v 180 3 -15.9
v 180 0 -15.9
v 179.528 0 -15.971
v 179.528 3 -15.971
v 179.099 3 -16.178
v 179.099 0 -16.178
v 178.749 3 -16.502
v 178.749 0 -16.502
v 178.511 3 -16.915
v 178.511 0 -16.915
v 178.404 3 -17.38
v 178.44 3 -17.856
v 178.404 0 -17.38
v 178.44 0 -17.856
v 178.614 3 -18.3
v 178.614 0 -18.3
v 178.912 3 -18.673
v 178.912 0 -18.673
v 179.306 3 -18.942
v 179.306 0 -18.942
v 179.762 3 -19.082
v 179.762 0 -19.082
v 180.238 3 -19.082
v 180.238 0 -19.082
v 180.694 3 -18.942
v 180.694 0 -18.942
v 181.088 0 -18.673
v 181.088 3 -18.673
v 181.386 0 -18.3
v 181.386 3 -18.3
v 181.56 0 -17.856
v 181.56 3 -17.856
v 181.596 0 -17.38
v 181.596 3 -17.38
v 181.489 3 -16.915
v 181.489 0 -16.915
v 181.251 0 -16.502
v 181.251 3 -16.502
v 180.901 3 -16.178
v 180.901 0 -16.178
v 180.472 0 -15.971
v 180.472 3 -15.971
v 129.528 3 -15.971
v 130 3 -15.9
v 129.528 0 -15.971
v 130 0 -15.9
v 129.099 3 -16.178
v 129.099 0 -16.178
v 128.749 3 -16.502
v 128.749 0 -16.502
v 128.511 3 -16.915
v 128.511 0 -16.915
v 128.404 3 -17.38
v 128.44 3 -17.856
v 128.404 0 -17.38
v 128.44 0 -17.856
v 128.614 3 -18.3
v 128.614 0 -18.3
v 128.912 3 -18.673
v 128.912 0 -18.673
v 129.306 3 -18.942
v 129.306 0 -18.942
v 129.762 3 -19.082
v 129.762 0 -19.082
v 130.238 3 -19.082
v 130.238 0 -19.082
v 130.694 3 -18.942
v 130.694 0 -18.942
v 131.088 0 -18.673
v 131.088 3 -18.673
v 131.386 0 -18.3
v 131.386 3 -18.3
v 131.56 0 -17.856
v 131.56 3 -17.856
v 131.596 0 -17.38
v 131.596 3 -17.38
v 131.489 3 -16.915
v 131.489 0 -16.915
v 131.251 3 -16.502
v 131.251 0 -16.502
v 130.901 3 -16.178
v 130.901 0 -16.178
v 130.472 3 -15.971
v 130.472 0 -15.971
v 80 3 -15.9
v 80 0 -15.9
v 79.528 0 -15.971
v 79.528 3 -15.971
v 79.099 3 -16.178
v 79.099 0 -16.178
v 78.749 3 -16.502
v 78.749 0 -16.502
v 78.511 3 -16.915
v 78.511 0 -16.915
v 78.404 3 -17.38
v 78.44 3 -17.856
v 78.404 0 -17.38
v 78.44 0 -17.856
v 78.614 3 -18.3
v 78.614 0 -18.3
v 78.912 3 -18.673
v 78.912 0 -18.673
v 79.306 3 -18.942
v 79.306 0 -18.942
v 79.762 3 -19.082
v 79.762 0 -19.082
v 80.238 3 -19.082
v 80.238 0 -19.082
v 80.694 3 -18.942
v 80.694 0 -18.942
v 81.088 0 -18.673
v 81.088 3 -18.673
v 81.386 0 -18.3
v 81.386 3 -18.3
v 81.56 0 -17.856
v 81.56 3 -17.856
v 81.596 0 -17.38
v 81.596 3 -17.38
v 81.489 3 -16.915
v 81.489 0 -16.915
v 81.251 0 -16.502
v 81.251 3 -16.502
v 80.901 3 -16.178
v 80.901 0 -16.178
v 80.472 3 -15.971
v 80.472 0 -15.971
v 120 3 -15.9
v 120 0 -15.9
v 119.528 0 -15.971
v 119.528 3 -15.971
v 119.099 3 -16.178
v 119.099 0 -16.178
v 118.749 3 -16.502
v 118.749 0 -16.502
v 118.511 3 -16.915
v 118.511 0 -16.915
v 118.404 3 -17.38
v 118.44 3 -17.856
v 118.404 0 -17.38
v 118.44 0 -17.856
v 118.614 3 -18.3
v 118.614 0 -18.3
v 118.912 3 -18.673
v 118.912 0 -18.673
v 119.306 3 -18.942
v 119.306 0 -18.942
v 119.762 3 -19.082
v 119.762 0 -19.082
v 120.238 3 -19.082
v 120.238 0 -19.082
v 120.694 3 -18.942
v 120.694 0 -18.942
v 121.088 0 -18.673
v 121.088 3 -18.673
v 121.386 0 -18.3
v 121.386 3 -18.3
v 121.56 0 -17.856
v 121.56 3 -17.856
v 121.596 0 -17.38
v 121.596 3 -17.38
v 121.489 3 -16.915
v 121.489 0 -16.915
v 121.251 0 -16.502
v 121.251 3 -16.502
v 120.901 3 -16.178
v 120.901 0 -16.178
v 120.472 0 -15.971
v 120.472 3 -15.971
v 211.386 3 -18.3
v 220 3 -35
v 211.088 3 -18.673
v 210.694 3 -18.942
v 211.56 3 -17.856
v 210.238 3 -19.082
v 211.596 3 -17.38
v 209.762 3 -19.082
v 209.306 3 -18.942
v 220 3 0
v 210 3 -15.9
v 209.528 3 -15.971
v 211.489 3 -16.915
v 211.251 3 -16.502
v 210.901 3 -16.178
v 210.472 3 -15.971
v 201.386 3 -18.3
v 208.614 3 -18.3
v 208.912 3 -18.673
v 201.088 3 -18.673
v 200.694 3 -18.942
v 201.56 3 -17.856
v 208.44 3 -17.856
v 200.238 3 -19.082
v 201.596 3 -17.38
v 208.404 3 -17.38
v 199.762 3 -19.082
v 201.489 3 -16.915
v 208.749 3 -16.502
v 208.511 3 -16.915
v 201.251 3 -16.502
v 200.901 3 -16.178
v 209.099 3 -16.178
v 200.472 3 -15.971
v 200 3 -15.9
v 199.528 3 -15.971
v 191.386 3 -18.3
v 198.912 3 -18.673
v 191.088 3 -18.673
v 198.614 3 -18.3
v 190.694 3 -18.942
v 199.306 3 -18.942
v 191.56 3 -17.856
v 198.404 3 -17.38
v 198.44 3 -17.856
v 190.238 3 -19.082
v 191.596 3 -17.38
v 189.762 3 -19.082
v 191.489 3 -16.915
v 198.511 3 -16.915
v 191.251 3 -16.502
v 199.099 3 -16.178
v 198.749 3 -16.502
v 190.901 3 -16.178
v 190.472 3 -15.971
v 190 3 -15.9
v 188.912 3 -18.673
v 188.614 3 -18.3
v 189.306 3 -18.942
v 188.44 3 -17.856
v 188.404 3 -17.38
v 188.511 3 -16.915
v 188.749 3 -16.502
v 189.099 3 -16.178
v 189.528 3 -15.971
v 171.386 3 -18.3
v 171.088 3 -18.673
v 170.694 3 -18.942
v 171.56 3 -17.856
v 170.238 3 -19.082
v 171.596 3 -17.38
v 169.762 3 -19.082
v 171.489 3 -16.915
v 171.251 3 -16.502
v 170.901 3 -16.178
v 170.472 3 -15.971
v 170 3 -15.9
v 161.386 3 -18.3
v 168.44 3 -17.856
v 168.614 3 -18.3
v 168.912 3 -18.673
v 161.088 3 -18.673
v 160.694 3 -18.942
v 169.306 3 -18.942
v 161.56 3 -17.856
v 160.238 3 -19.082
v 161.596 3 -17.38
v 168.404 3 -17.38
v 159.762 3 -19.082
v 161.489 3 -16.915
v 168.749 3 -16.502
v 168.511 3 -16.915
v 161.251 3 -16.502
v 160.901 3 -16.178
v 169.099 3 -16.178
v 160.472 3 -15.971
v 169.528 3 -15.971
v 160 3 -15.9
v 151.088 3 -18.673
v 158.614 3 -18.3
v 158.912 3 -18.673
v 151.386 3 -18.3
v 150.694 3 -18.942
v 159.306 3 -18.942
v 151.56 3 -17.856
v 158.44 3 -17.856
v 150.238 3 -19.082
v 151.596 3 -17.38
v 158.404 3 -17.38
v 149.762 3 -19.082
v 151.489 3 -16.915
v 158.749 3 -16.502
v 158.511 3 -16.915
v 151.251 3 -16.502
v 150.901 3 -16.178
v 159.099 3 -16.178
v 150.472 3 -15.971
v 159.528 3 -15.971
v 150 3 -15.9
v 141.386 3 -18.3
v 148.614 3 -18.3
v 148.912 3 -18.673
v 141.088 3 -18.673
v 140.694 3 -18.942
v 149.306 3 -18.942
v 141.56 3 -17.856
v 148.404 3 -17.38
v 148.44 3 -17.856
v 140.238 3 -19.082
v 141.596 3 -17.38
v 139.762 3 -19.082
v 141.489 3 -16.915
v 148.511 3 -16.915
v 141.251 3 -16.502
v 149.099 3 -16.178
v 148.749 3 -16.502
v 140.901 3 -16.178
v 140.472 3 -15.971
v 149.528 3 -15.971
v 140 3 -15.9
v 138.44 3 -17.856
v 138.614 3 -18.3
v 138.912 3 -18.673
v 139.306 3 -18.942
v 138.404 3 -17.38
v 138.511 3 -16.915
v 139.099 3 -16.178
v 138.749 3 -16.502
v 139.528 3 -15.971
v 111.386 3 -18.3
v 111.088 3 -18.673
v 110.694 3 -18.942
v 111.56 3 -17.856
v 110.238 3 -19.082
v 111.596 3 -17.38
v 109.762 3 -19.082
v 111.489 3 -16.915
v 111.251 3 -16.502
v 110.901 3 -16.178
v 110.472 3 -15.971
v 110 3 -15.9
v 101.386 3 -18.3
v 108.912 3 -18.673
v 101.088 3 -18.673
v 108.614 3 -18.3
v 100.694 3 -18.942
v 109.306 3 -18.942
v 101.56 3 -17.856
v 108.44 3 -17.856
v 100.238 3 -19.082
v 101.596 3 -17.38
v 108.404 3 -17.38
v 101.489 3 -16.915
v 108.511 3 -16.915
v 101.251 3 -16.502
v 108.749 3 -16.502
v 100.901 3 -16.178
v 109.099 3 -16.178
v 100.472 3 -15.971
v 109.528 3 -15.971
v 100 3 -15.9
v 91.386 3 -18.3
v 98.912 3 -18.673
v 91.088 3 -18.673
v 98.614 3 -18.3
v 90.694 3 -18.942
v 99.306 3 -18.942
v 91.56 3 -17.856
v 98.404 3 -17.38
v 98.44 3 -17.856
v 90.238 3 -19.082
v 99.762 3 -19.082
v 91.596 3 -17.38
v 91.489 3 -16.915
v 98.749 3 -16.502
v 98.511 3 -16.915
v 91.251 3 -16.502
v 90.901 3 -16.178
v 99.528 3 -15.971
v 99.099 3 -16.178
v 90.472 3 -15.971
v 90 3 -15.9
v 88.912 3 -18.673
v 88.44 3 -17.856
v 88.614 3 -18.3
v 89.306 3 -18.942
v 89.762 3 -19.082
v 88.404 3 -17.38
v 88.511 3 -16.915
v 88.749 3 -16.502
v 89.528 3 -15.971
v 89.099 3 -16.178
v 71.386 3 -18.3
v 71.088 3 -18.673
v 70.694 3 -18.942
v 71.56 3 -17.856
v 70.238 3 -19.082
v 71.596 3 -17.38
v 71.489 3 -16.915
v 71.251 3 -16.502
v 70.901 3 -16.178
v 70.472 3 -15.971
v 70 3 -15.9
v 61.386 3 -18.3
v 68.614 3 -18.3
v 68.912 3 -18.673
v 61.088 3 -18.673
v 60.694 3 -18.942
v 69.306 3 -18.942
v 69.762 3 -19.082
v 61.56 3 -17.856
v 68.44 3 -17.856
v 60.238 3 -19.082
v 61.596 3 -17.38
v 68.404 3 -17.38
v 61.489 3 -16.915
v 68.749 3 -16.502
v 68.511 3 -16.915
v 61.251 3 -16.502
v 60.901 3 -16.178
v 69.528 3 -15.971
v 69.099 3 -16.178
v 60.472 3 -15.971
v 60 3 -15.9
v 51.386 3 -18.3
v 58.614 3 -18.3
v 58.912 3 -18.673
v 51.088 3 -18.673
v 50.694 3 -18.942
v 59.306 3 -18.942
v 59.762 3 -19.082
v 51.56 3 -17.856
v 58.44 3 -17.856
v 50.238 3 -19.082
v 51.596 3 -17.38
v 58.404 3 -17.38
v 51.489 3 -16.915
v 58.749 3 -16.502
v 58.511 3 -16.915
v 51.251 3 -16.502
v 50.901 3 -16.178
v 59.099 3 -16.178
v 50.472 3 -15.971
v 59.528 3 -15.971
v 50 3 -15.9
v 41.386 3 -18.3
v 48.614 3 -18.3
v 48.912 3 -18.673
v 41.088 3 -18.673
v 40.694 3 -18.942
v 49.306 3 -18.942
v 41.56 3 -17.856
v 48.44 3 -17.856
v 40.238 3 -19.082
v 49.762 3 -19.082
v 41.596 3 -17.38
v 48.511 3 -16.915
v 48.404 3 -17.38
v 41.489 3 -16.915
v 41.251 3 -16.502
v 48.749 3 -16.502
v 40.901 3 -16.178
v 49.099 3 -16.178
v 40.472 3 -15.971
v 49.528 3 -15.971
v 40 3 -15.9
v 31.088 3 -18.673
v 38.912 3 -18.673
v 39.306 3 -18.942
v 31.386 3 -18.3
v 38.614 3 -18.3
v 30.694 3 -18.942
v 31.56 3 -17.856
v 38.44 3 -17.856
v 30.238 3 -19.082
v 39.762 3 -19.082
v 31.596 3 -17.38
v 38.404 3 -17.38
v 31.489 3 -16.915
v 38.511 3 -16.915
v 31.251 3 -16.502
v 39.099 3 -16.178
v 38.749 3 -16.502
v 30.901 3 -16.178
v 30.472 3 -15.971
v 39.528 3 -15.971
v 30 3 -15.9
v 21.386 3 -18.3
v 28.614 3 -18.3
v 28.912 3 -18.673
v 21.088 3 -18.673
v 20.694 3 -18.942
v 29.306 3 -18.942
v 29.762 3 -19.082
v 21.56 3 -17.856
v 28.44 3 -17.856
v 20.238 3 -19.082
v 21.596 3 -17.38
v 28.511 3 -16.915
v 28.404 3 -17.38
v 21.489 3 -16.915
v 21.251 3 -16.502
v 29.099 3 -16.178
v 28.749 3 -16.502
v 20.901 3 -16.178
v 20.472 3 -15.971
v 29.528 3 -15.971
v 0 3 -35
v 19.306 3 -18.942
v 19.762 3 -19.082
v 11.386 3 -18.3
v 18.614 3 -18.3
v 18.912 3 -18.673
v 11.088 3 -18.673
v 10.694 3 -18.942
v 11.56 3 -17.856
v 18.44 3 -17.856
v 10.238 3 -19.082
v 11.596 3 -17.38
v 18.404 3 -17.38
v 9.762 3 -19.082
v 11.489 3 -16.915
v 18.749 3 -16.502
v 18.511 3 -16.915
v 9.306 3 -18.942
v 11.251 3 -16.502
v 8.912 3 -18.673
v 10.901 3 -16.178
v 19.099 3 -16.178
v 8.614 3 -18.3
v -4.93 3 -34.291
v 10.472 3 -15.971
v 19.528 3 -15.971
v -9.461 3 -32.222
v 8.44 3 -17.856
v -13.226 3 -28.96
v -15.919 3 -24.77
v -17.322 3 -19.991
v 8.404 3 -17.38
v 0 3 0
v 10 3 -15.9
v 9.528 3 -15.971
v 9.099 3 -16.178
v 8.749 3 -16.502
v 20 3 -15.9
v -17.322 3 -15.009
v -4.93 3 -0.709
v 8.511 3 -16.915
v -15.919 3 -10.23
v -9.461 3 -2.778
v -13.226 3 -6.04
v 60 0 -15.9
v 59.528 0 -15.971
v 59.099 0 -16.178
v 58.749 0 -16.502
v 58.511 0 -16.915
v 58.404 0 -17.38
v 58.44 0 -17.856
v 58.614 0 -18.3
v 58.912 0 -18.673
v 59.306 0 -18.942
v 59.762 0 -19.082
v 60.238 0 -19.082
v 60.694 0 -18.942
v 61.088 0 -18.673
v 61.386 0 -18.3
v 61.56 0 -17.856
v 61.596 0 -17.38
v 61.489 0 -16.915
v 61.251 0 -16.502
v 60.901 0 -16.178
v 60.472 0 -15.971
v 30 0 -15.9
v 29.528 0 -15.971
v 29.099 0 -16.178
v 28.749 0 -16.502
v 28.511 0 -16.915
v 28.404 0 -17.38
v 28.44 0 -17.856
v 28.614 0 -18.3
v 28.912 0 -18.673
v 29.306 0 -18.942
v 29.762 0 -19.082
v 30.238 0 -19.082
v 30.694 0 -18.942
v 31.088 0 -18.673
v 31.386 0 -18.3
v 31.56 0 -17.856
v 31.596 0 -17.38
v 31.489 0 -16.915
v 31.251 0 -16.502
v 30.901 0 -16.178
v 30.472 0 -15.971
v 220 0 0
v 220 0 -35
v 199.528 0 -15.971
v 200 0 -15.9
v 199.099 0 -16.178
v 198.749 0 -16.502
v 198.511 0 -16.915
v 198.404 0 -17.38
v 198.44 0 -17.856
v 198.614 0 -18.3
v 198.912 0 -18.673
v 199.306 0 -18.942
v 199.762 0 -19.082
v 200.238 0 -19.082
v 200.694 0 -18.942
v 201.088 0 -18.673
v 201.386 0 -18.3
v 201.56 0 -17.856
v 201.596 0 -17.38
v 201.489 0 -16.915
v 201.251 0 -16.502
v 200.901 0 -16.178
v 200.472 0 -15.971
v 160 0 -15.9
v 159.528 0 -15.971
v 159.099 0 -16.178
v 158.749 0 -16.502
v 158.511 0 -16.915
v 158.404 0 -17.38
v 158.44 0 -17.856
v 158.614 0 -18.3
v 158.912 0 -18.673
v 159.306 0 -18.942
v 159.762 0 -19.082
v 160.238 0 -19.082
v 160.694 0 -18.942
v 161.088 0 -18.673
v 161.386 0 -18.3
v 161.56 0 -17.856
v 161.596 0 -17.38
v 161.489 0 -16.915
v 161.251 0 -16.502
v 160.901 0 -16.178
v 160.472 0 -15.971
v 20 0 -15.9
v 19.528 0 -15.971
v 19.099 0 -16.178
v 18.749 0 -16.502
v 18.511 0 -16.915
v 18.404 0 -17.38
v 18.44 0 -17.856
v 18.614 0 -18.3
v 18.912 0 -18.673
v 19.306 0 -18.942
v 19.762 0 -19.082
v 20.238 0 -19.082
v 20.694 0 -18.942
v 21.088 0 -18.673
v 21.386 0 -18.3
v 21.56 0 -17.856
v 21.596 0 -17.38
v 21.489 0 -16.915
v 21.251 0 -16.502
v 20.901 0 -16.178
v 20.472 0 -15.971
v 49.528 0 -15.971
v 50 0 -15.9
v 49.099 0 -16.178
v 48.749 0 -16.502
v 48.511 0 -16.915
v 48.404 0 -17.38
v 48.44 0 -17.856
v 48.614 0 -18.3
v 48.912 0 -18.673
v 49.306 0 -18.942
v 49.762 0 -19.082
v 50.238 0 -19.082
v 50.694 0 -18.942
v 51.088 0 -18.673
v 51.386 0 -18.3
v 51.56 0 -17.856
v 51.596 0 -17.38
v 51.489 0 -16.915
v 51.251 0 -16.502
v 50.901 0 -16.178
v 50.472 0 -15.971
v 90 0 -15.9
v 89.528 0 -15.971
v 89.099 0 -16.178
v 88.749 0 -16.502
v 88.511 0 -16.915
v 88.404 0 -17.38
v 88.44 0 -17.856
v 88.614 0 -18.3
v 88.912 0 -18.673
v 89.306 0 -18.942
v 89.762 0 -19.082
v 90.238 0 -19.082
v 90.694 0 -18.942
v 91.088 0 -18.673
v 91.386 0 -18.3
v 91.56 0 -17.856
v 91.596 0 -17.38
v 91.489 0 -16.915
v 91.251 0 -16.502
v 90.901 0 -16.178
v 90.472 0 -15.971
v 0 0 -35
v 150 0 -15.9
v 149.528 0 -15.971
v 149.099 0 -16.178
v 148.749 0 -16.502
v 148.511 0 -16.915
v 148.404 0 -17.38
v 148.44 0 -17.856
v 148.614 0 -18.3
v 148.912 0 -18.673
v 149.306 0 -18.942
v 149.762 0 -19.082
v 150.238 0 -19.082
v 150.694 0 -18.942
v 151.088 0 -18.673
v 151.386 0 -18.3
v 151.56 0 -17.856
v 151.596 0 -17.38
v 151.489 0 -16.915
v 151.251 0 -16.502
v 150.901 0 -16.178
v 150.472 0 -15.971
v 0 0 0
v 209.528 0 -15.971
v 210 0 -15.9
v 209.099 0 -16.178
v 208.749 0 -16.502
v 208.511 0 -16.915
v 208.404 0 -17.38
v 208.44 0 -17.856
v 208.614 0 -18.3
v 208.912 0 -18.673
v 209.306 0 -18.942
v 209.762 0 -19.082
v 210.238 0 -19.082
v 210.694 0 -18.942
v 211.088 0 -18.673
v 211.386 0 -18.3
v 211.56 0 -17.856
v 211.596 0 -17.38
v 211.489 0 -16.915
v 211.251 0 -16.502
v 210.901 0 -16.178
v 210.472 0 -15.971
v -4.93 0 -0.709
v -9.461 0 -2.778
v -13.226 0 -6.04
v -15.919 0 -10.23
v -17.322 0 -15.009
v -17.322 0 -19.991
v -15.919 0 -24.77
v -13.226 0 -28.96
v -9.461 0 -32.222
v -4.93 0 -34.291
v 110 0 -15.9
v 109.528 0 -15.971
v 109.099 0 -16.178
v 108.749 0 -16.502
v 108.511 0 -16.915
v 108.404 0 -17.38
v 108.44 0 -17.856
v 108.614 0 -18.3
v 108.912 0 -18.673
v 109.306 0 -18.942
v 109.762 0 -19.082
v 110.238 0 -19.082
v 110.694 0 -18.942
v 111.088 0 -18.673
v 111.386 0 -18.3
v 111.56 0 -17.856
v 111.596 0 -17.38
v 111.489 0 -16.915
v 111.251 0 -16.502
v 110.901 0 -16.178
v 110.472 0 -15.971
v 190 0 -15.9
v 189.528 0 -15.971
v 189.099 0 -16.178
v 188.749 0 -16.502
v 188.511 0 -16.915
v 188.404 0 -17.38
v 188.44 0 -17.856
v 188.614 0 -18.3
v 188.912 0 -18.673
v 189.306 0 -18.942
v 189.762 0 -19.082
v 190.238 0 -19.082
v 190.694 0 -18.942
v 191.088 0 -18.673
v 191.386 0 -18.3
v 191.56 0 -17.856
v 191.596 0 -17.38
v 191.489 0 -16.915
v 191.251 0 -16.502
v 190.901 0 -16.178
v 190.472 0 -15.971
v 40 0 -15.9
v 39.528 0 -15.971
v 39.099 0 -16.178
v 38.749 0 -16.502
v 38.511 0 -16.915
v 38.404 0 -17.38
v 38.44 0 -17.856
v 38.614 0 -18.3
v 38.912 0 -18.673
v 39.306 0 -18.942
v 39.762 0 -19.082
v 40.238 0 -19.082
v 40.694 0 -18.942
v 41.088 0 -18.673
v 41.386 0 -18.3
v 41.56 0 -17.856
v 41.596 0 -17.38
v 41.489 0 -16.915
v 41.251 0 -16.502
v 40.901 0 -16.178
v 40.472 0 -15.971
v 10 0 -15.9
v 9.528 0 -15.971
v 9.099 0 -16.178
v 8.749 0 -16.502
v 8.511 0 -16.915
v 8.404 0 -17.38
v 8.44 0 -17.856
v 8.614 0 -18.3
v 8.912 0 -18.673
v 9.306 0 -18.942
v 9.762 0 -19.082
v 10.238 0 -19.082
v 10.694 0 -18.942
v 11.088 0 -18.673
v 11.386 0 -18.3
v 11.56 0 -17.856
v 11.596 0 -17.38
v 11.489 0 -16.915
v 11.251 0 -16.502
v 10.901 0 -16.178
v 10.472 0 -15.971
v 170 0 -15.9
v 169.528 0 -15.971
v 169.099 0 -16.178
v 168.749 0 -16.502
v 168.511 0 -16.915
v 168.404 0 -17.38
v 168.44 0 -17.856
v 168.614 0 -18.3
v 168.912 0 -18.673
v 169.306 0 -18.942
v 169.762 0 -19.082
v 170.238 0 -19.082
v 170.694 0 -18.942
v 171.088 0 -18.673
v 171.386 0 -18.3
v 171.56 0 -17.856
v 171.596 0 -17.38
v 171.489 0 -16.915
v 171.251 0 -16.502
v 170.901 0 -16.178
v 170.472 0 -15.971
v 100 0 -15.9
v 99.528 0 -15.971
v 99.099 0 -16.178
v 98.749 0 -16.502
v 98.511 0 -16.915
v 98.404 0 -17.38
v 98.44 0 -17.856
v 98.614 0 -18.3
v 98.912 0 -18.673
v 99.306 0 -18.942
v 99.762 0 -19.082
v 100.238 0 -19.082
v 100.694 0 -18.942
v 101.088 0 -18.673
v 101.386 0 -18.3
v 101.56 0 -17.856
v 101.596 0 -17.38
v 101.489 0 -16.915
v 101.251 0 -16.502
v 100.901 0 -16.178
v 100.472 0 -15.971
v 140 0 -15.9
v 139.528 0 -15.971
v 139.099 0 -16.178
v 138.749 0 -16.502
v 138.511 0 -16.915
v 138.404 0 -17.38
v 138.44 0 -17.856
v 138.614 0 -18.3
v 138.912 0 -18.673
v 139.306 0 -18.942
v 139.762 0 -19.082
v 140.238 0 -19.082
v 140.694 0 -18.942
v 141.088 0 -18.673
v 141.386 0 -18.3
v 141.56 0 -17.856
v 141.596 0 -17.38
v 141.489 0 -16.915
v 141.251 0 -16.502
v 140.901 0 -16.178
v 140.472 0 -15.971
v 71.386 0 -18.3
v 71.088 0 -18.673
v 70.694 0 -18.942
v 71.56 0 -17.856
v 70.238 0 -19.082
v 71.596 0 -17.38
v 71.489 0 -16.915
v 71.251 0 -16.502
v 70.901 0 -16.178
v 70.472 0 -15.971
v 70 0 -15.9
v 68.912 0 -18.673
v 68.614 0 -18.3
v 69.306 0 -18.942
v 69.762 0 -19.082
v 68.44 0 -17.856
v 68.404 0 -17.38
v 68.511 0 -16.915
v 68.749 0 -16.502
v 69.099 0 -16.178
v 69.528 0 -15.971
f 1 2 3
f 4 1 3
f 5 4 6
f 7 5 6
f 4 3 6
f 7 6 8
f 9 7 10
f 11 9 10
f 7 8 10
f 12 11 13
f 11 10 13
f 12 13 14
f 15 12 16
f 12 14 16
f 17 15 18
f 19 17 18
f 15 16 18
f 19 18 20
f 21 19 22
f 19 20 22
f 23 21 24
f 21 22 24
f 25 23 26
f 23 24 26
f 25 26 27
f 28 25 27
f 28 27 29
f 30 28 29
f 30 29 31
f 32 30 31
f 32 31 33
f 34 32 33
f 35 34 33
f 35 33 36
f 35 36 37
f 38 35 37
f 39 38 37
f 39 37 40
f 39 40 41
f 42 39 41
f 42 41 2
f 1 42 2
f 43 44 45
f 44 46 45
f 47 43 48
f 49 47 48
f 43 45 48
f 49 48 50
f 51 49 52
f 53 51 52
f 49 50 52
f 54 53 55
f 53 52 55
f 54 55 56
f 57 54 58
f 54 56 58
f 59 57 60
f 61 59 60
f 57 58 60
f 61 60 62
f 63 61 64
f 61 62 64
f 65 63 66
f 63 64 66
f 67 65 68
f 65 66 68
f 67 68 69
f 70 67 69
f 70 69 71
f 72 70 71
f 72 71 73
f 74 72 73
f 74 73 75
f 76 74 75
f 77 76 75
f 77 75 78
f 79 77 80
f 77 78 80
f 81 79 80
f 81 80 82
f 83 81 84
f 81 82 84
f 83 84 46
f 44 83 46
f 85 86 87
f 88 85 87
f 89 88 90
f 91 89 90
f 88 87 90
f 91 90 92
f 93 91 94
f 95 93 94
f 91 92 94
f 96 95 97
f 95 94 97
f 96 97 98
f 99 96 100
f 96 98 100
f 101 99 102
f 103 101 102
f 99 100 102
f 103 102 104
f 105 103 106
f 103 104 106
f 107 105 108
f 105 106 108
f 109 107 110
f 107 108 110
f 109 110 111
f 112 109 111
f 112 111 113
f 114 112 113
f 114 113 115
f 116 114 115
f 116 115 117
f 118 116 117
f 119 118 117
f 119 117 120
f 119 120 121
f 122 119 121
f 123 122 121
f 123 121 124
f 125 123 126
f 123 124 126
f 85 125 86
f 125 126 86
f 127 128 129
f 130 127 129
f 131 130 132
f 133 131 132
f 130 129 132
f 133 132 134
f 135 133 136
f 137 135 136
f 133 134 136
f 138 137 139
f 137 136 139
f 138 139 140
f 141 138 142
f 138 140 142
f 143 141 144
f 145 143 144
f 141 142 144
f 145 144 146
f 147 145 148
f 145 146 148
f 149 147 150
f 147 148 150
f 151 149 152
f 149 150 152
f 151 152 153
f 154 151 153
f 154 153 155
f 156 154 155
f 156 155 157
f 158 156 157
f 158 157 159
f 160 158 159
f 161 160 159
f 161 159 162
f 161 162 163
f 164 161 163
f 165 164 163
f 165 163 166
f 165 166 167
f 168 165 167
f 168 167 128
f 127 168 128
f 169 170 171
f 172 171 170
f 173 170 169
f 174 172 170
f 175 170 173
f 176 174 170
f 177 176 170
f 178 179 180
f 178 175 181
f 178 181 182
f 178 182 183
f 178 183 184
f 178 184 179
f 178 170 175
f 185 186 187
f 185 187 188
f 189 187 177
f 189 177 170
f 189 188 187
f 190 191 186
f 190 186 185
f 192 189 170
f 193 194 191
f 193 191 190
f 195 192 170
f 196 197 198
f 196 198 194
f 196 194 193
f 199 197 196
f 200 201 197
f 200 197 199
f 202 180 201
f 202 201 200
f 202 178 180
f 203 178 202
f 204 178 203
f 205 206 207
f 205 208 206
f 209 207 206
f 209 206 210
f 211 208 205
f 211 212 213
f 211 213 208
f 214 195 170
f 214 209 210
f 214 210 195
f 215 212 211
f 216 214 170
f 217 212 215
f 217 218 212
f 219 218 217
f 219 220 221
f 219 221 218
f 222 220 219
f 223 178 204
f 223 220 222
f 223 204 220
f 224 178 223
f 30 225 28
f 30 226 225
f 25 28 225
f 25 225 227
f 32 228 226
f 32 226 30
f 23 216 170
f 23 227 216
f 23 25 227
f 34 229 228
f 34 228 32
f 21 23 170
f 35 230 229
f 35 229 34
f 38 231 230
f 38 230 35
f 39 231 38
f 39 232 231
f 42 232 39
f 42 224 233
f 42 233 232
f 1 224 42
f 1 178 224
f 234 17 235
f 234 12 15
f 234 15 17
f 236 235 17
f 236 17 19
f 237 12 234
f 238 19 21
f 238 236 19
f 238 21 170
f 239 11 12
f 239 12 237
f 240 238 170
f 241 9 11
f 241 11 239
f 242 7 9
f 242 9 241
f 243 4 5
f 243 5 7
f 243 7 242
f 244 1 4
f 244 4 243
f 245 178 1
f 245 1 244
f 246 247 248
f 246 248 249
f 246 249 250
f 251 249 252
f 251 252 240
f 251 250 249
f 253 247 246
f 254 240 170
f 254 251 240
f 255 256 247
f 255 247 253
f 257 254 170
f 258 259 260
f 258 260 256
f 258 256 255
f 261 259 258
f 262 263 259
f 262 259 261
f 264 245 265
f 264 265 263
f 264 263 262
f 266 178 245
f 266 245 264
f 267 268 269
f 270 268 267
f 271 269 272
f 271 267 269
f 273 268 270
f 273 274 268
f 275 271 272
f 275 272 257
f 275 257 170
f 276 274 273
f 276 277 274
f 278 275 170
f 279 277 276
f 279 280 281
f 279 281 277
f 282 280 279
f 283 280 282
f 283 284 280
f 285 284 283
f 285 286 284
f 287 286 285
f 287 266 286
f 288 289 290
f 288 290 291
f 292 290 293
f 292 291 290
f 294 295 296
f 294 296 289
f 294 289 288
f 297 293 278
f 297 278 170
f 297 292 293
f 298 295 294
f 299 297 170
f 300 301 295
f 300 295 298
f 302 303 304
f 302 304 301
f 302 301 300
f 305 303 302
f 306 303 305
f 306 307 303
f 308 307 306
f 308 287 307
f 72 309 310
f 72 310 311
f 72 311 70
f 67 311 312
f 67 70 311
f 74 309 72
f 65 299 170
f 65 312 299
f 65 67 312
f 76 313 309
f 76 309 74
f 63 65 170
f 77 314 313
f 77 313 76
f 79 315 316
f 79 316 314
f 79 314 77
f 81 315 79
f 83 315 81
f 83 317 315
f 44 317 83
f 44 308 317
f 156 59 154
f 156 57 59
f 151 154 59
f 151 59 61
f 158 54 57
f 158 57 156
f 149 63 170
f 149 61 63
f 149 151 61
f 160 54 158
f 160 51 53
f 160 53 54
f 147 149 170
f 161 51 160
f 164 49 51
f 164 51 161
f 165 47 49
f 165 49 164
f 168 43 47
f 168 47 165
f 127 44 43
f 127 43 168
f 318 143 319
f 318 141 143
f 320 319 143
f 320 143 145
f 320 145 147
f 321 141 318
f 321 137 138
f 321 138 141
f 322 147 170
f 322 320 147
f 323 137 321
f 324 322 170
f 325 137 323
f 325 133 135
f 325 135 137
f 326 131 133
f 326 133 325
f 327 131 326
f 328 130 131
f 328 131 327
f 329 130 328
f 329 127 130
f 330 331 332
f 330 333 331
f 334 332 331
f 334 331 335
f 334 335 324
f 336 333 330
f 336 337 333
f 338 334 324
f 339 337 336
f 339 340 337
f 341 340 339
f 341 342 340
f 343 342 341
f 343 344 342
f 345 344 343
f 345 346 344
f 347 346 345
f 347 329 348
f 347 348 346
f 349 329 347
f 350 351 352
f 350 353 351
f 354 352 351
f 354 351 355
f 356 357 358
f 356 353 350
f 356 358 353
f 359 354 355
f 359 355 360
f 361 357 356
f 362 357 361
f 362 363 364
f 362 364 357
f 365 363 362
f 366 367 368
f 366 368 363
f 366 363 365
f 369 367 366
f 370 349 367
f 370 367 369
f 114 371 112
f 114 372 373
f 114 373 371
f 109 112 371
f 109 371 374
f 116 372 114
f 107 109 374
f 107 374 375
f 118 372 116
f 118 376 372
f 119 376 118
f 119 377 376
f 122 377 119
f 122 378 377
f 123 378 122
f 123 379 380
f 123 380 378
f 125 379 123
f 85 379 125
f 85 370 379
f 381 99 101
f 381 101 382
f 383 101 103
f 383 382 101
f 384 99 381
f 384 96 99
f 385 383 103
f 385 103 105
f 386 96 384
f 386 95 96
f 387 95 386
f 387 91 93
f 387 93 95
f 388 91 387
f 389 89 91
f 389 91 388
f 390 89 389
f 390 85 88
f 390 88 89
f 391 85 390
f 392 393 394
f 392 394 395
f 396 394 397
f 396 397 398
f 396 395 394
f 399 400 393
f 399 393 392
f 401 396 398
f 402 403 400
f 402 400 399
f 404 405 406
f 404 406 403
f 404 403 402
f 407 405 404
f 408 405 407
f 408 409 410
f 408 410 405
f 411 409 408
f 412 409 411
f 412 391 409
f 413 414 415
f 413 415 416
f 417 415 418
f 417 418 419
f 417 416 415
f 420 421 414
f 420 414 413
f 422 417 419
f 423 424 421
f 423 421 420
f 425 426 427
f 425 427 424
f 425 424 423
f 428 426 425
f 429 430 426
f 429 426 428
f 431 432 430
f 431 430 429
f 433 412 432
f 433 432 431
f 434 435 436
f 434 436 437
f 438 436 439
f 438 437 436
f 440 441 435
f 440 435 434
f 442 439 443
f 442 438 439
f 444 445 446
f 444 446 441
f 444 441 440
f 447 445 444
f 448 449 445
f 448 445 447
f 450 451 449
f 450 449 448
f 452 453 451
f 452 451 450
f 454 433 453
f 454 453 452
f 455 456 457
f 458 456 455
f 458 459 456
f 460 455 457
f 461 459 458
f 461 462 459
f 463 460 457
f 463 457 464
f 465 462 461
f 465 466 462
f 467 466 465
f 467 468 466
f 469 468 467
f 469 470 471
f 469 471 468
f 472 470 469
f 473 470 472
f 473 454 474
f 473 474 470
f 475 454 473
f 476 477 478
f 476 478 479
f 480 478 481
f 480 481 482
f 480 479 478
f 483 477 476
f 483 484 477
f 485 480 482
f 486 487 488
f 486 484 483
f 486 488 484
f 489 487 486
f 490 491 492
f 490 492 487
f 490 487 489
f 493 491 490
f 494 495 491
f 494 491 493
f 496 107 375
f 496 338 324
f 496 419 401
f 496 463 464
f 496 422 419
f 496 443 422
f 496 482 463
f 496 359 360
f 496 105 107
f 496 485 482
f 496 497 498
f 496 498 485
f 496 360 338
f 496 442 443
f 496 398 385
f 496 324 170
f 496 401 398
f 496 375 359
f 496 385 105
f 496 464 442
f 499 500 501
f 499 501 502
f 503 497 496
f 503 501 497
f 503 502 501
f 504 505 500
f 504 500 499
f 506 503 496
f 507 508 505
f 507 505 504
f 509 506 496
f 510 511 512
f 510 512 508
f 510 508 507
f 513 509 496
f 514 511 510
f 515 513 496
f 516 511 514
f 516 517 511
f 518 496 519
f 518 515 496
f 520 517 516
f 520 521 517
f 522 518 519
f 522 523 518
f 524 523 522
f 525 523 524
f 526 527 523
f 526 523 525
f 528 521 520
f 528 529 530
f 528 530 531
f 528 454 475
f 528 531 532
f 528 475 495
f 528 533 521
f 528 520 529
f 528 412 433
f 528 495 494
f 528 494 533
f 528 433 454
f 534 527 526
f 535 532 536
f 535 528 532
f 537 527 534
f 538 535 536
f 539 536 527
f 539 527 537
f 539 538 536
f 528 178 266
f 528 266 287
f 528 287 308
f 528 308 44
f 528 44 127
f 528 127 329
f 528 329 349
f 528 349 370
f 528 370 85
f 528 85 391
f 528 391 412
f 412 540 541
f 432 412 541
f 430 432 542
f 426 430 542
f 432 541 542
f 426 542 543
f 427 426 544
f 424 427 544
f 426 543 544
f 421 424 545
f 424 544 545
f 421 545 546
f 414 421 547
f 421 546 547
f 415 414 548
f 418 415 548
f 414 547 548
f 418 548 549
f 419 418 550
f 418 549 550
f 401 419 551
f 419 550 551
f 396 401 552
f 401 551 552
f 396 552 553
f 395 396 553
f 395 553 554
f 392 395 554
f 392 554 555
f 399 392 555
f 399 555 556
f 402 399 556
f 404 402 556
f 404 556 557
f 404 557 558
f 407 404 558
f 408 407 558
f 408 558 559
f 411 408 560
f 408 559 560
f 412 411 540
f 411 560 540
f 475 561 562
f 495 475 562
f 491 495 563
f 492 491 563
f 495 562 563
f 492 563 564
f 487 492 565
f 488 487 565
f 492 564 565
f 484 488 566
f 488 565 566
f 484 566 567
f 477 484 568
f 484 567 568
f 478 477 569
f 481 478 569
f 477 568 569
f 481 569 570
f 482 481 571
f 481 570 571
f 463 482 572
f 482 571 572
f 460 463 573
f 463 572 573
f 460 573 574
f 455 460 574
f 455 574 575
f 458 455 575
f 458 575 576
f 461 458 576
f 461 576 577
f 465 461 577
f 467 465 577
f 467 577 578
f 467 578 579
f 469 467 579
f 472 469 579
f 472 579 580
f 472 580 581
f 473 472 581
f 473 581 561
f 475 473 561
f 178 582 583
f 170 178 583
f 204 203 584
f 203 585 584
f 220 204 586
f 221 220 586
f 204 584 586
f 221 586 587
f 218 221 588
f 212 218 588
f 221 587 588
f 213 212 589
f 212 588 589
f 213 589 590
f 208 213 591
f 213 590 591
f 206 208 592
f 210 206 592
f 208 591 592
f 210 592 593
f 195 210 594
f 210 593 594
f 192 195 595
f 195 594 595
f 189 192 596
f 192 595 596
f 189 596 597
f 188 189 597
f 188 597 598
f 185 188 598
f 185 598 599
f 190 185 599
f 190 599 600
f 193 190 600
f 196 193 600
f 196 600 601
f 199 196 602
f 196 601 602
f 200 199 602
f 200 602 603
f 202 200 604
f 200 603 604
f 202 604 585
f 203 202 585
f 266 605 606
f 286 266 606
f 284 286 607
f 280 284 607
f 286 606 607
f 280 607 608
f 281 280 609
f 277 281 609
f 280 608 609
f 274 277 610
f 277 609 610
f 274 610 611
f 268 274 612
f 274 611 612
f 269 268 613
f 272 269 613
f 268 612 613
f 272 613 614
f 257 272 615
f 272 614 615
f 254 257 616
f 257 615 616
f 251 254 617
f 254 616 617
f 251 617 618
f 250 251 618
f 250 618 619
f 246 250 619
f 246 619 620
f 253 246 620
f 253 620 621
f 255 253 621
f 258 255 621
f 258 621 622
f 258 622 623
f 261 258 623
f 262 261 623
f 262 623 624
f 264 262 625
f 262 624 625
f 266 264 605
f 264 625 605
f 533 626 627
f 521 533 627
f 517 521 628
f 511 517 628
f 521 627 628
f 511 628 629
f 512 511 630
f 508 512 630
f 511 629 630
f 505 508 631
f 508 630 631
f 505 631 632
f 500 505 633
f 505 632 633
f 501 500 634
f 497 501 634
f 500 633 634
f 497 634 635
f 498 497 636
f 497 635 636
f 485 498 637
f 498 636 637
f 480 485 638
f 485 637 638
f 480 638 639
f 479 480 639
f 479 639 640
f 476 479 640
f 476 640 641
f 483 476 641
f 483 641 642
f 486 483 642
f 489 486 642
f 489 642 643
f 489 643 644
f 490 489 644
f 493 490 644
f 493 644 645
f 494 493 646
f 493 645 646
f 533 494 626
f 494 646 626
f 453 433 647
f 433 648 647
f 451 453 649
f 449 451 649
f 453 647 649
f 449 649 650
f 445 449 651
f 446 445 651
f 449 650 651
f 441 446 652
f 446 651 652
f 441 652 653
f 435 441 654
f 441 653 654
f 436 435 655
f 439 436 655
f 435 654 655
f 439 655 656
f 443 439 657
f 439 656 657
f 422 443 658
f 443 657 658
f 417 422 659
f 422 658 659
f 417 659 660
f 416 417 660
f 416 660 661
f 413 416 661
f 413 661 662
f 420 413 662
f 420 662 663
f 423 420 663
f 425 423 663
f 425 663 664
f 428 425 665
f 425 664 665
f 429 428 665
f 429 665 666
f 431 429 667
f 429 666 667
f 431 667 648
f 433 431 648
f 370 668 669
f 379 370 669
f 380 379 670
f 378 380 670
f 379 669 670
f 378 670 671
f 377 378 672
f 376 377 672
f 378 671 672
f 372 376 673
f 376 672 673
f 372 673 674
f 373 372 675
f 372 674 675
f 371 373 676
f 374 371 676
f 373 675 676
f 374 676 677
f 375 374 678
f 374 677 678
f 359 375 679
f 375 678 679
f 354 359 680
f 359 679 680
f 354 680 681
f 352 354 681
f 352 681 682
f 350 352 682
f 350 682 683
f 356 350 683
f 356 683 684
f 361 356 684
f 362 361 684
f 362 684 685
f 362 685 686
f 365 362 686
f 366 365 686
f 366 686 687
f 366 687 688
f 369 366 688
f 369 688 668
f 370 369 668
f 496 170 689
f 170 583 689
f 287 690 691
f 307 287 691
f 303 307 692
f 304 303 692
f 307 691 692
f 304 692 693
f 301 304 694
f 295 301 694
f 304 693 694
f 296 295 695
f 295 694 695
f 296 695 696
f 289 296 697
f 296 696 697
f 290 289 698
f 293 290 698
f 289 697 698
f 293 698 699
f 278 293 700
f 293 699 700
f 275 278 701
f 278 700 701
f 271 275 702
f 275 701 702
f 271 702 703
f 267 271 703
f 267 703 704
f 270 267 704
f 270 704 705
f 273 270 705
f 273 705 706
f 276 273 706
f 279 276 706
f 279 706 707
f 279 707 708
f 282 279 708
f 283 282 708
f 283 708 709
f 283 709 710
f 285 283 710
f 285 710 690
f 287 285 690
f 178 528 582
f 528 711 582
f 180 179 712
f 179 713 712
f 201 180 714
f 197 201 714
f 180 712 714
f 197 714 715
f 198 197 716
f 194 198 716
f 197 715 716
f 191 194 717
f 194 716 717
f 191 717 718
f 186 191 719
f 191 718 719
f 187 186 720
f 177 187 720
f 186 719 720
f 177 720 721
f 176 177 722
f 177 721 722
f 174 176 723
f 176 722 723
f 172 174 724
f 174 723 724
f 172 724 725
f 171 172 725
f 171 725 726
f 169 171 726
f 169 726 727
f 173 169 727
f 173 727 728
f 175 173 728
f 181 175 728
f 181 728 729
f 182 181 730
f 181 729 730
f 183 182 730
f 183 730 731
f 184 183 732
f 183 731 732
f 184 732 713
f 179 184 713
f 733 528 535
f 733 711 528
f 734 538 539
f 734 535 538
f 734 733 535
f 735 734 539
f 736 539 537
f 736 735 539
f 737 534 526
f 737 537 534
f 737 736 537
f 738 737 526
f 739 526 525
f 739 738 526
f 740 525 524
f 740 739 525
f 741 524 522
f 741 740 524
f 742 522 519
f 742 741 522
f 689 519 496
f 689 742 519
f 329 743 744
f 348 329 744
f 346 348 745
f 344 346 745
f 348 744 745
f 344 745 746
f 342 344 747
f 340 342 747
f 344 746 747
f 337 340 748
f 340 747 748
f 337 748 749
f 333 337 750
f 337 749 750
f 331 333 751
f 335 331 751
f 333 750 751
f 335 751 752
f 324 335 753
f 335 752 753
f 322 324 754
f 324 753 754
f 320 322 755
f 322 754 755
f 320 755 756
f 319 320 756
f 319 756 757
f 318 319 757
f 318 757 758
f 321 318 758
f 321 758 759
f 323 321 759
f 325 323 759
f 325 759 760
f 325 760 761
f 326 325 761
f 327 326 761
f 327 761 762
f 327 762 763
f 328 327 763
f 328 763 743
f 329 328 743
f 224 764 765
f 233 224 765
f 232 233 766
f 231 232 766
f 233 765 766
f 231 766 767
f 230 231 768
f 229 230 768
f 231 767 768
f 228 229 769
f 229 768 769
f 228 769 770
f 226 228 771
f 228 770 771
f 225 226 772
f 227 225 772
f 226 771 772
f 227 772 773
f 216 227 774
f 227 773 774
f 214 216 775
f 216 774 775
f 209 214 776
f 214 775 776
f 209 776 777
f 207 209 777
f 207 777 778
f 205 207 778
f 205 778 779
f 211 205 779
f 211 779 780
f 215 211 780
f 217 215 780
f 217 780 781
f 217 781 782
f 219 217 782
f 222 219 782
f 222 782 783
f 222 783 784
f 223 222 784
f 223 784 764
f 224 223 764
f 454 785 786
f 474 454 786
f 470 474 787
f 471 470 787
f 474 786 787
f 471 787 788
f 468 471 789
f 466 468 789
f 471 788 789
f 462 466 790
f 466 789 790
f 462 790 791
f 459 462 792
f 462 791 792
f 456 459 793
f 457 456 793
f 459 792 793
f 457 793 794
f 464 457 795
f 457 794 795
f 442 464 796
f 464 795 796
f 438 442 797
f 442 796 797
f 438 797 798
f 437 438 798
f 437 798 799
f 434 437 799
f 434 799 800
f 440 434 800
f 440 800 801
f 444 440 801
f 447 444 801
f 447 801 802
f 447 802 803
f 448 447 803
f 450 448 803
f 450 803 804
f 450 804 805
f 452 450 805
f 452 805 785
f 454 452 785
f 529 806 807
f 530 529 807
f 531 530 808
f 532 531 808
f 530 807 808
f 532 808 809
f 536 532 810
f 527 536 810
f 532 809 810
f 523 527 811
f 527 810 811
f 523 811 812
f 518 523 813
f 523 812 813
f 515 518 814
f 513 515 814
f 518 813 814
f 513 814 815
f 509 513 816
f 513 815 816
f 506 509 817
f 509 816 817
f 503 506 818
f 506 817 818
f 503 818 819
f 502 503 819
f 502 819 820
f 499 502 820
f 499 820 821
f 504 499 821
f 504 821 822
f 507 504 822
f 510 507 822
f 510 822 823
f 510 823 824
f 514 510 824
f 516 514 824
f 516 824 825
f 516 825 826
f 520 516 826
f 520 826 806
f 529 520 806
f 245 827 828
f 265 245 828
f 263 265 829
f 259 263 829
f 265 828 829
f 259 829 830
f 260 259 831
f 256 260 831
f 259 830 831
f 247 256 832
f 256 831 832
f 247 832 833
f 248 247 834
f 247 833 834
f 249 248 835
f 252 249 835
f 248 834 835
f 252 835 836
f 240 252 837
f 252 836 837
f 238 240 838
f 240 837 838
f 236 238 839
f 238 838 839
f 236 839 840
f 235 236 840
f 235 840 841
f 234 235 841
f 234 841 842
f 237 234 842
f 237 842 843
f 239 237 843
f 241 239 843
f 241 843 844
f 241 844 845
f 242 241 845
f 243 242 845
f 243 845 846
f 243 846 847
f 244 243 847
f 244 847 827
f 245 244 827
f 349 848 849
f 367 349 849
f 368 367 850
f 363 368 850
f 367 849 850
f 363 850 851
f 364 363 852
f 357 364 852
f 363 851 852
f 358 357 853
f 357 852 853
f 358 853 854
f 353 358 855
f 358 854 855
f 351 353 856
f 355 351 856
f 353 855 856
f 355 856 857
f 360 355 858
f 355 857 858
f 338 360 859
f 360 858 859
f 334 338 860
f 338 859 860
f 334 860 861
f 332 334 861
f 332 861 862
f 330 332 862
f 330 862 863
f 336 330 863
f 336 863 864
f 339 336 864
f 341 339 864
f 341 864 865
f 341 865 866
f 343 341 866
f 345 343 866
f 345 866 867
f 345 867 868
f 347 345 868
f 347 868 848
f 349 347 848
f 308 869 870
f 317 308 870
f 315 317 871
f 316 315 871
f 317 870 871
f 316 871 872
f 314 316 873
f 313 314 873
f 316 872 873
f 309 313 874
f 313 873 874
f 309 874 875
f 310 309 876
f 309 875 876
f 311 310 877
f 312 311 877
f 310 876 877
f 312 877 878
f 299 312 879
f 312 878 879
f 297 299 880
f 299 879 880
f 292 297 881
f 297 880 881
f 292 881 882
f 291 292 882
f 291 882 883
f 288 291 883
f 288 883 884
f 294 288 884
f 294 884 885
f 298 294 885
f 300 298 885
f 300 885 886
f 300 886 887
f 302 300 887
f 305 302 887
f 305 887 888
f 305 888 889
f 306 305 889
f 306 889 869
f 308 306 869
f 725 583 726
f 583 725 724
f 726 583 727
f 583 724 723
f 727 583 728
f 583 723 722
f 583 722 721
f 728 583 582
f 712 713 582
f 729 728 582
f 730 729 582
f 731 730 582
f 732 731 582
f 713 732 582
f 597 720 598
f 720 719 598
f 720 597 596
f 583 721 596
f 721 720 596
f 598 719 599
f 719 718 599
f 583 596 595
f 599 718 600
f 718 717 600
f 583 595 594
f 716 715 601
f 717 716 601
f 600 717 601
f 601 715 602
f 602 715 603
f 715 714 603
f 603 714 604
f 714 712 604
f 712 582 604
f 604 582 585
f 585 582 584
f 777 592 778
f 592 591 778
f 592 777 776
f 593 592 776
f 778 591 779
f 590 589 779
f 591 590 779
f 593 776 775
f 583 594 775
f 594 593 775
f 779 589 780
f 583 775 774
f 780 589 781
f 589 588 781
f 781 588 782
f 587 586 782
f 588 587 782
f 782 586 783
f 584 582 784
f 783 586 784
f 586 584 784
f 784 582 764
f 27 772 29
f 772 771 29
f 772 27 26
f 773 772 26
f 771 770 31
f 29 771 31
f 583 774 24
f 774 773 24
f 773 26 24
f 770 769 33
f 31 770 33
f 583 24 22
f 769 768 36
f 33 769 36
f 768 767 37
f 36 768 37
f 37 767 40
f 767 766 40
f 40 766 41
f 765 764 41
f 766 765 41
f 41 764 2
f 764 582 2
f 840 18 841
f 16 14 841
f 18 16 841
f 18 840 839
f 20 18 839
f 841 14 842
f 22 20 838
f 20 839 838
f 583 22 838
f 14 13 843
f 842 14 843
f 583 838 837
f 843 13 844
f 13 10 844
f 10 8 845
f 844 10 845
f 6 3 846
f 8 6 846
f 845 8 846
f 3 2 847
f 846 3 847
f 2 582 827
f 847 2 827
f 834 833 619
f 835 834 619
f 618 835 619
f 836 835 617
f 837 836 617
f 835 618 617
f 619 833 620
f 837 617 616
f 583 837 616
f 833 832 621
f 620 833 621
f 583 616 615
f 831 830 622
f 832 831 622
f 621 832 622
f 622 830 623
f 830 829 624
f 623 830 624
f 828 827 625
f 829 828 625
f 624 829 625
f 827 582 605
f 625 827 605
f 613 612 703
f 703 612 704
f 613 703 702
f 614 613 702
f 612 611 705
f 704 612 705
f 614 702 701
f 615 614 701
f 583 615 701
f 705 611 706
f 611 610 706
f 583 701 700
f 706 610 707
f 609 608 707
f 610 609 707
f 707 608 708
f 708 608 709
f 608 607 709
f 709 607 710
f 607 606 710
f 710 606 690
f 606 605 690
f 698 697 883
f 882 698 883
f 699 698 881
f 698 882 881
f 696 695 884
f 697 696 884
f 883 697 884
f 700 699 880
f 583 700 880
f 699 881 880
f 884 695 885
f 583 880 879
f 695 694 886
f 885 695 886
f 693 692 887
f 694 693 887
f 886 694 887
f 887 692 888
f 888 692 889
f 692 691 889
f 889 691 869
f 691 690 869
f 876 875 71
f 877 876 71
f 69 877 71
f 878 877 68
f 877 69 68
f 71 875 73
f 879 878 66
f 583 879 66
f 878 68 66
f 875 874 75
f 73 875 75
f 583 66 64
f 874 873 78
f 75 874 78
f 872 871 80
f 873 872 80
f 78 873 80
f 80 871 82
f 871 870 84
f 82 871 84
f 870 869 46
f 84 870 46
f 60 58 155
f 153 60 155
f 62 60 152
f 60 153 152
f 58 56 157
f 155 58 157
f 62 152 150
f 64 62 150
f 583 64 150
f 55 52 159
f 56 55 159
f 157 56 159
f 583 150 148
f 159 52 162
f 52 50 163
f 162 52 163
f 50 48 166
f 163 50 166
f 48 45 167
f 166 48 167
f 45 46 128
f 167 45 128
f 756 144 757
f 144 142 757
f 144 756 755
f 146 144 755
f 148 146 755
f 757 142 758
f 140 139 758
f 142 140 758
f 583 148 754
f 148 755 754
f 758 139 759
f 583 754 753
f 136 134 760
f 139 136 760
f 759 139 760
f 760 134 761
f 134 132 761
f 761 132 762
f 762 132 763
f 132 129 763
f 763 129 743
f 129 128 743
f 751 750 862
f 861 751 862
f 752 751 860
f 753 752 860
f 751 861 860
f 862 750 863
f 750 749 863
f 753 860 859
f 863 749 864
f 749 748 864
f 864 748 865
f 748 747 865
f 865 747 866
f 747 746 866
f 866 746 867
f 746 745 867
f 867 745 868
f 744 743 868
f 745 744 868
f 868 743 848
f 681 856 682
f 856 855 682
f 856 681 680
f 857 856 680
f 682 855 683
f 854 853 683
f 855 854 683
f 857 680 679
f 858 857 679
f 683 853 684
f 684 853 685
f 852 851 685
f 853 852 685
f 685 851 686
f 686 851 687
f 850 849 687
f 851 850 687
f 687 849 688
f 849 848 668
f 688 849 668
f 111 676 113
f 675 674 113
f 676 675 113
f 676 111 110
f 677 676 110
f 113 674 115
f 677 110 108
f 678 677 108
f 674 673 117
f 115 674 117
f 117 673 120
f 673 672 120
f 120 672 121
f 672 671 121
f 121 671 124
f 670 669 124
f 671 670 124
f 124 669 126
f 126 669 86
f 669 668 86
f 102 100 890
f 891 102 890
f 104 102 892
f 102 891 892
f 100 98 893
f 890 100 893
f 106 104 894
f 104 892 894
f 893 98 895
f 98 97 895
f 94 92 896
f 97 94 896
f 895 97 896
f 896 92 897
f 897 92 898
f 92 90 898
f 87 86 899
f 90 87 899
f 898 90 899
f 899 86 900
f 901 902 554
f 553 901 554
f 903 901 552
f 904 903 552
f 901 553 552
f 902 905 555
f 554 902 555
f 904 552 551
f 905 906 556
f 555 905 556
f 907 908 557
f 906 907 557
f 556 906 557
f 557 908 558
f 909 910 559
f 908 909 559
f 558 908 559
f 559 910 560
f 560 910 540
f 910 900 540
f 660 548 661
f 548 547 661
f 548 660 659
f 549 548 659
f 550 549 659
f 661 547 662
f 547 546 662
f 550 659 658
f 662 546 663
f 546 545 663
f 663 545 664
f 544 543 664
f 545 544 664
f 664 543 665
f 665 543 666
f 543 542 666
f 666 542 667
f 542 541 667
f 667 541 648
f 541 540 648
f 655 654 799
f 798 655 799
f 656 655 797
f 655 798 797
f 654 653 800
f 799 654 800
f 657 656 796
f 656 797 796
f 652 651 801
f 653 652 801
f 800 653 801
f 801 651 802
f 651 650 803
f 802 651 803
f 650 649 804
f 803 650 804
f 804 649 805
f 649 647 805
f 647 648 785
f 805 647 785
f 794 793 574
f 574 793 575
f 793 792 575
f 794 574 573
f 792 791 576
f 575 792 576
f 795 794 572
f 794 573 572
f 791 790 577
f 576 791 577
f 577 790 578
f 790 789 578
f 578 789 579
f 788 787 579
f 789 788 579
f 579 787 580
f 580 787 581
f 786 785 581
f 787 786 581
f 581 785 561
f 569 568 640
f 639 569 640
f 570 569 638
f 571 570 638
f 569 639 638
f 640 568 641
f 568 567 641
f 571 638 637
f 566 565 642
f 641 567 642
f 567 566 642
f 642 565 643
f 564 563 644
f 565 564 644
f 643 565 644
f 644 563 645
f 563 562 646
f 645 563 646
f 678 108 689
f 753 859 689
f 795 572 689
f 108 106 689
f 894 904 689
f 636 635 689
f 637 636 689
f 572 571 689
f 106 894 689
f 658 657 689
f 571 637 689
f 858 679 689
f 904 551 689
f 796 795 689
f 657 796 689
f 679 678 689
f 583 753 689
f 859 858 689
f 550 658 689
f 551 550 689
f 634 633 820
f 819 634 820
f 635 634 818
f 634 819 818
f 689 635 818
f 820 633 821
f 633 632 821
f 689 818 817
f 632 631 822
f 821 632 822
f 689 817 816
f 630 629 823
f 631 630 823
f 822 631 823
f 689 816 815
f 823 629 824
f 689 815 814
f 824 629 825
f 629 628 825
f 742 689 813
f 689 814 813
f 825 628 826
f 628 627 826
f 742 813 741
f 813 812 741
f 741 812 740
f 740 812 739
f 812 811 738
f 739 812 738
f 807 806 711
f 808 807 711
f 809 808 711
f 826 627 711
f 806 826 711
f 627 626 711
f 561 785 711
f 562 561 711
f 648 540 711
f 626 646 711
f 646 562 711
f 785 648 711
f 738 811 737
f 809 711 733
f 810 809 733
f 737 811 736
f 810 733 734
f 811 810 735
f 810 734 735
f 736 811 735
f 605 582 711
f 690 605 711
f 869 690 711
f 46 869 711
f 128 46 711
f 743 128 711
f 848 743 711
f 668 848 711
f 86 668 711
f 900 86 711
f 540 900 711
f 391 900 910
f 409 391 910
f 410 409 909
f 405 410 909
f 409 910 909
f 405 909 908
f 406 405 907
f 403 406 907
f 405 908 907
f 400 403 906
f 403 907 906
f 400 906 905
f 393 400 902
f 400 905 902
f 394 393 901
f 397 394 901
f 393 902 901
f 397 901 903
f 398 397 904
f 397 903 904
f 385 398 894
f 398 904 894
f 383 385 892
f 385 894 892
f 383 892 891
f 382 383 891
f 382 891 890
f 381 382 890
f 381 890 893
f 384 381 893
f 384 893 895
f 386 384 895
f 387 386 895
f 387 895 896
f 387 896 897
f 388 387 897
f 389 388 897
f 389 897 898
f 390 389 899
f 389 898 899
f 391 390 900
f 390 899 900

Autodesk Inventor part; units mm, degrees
ref_plane "YZ Plane" through (0, 0, 0) normal (1, 0, 0) x (0, 1, 0)
ref_plane "XZ Plane" through (0, 0, 0) normal (0, 1, 0) x (-1, 0, 0)
ref_plane "XY Plane" through (0, 0, 0) normal (0, 0, 1) x (1, 0, 0)
sketch "スケッチ1" plane through (0, 0, 0) normal (0, 1, 0) x (-1, 0, 0)
  line L0 (0, 0) -> (-220, 0)
  line L1 (-220, 0) -> (-220, -35)
  line L2 (-220, -35) -> (0, -35)
  line L3 (0, -35) -> (0, 0)
  arc A0 (0, -35) -> (0, 0) centre (0, -17.5) ccw
  dimension "d0" = 220
  dimension "d1" = 35
  dimension "d2" = 17.5
extrude "押し出し1" add sketch "スケッチ1" along normal blind 3
sketch "スケッチ2" plane through (0, 3, 0) normal (0, 1, 0) x (1, 0, 0)
  line L0 (0, 17.5) -> (238.6526, 17.5)
  line L1 (0, 0) -> (220, 0) projected
  arc A0 (0, 35) -> (0, 0) centre (0, 17.5) ccw projected
  point P0 (20, 17.5)
  point P1 (30, 17.5)
  point P2 (40, 17.5)
  point P3 (50, 17.5)
  point P4 (60, 17.5)
  point P5 (70, 17.5)
  point P6 (80, 17.5)
  point P7 (90, 17.5)
  point P8 (100, 17.5)
  point P9 (110, 17.5)
  point P10 (120, 17.5)
  point P11 (130, 17.5)
  point P12 (140, 17.5)
  point P13 (150, 17.5)
  point P14 (160, 17.5)
  point P15 (170, 17.5)
  point P16 (180, 17.5)
  point P17 (190, 17.5)
  point P18 (200, 17.5)
  point P19 (210, 17.5)
  point P20 (-17.5, 17.5)
  point P21 (10, 17.5)
  dimension "d5" = 17.5
  dimension "d6" = 10
  dimension "d7" = 10
  dimension "d8" = 10
  dimension "d9" = 10
  dimension "d10" = 10
  dimension "d11" = 10
  dimension "d12" = 10
  dimension "d13" = 10
  dimension "d14" = 10
  dimension "d15" = 10
  dimension "d16" = 10
  dimension "d17" = 10
  dimension "d18" = 10
  dimension "d19" = 10
  dimension "d20" = 10
  dimension "d21" = 10
  dimension "d22" = 10
  dimension "d23" = 10
  dimension "d24" = 10
  dimension "d35" = 17.5
  dimension "d55" = 10
  dimension "d56" = 10
hole "穴1" at (20, 3, -17.5) at (30, 3, -17.5) at (40, 3, -17.5) at (50, 3, -17.5) at (60, 3, -17.5) at (70, 3, -17.5) at (80, 3, -17.5) at (90, 3, -17.5) at (100, 3, -17.5) at (110, 3, -17.5) at (120, 3, -17.5) at (130, 3, -17.5) at (140, 3, -17.5) at (150, 3, -17.5) at (160, 3, -17.5) at (170, 3, -17.5) at (180, 3, -17.5) at (190, 3, -17.5) at (200, 3, -17.5) at (210, 3, -17.5) at (10, 3, -17.5) direction (0, -1, 0) diameter 3.2 end through all
sketch "スケッチ3" plane through (0, 3, 0) normal (0, 1, 0) x (1, 0, 0)
  line L0 (220, 35) -> (0, 35) projected
  point P0 (0, 0)
  point P1 (0, 17.5)
  dimension "d36" = 17.5
hole "穴2" [suppressed]
sketch "スケッチ4" plane through (0, 3, 0) normal (0, 1, 0) x (1, 0, 0)
  circle A0 centre (0, 17.5) radius 6
  circle A1 centre (0, 17.5) radius 3.15 projected
  line L0 (-0.1439, 17.5) -> (-6.5454, 17.5)
  line L1 (-6.5454, 17.5) -> (7.5104, 17.5)
  point P0 (0, 0)
  point P1 (0, 11.5)
  point P2 (6, 17.5)
  point P3 (0, 23.5)
  point P4 (-6, 17.5)
  dimension "d44" = 12
  dimension "d45" = 0
hole "穴3" [suppressed]
properties part number "arm_plate4" material "アルミニウム 5052"
